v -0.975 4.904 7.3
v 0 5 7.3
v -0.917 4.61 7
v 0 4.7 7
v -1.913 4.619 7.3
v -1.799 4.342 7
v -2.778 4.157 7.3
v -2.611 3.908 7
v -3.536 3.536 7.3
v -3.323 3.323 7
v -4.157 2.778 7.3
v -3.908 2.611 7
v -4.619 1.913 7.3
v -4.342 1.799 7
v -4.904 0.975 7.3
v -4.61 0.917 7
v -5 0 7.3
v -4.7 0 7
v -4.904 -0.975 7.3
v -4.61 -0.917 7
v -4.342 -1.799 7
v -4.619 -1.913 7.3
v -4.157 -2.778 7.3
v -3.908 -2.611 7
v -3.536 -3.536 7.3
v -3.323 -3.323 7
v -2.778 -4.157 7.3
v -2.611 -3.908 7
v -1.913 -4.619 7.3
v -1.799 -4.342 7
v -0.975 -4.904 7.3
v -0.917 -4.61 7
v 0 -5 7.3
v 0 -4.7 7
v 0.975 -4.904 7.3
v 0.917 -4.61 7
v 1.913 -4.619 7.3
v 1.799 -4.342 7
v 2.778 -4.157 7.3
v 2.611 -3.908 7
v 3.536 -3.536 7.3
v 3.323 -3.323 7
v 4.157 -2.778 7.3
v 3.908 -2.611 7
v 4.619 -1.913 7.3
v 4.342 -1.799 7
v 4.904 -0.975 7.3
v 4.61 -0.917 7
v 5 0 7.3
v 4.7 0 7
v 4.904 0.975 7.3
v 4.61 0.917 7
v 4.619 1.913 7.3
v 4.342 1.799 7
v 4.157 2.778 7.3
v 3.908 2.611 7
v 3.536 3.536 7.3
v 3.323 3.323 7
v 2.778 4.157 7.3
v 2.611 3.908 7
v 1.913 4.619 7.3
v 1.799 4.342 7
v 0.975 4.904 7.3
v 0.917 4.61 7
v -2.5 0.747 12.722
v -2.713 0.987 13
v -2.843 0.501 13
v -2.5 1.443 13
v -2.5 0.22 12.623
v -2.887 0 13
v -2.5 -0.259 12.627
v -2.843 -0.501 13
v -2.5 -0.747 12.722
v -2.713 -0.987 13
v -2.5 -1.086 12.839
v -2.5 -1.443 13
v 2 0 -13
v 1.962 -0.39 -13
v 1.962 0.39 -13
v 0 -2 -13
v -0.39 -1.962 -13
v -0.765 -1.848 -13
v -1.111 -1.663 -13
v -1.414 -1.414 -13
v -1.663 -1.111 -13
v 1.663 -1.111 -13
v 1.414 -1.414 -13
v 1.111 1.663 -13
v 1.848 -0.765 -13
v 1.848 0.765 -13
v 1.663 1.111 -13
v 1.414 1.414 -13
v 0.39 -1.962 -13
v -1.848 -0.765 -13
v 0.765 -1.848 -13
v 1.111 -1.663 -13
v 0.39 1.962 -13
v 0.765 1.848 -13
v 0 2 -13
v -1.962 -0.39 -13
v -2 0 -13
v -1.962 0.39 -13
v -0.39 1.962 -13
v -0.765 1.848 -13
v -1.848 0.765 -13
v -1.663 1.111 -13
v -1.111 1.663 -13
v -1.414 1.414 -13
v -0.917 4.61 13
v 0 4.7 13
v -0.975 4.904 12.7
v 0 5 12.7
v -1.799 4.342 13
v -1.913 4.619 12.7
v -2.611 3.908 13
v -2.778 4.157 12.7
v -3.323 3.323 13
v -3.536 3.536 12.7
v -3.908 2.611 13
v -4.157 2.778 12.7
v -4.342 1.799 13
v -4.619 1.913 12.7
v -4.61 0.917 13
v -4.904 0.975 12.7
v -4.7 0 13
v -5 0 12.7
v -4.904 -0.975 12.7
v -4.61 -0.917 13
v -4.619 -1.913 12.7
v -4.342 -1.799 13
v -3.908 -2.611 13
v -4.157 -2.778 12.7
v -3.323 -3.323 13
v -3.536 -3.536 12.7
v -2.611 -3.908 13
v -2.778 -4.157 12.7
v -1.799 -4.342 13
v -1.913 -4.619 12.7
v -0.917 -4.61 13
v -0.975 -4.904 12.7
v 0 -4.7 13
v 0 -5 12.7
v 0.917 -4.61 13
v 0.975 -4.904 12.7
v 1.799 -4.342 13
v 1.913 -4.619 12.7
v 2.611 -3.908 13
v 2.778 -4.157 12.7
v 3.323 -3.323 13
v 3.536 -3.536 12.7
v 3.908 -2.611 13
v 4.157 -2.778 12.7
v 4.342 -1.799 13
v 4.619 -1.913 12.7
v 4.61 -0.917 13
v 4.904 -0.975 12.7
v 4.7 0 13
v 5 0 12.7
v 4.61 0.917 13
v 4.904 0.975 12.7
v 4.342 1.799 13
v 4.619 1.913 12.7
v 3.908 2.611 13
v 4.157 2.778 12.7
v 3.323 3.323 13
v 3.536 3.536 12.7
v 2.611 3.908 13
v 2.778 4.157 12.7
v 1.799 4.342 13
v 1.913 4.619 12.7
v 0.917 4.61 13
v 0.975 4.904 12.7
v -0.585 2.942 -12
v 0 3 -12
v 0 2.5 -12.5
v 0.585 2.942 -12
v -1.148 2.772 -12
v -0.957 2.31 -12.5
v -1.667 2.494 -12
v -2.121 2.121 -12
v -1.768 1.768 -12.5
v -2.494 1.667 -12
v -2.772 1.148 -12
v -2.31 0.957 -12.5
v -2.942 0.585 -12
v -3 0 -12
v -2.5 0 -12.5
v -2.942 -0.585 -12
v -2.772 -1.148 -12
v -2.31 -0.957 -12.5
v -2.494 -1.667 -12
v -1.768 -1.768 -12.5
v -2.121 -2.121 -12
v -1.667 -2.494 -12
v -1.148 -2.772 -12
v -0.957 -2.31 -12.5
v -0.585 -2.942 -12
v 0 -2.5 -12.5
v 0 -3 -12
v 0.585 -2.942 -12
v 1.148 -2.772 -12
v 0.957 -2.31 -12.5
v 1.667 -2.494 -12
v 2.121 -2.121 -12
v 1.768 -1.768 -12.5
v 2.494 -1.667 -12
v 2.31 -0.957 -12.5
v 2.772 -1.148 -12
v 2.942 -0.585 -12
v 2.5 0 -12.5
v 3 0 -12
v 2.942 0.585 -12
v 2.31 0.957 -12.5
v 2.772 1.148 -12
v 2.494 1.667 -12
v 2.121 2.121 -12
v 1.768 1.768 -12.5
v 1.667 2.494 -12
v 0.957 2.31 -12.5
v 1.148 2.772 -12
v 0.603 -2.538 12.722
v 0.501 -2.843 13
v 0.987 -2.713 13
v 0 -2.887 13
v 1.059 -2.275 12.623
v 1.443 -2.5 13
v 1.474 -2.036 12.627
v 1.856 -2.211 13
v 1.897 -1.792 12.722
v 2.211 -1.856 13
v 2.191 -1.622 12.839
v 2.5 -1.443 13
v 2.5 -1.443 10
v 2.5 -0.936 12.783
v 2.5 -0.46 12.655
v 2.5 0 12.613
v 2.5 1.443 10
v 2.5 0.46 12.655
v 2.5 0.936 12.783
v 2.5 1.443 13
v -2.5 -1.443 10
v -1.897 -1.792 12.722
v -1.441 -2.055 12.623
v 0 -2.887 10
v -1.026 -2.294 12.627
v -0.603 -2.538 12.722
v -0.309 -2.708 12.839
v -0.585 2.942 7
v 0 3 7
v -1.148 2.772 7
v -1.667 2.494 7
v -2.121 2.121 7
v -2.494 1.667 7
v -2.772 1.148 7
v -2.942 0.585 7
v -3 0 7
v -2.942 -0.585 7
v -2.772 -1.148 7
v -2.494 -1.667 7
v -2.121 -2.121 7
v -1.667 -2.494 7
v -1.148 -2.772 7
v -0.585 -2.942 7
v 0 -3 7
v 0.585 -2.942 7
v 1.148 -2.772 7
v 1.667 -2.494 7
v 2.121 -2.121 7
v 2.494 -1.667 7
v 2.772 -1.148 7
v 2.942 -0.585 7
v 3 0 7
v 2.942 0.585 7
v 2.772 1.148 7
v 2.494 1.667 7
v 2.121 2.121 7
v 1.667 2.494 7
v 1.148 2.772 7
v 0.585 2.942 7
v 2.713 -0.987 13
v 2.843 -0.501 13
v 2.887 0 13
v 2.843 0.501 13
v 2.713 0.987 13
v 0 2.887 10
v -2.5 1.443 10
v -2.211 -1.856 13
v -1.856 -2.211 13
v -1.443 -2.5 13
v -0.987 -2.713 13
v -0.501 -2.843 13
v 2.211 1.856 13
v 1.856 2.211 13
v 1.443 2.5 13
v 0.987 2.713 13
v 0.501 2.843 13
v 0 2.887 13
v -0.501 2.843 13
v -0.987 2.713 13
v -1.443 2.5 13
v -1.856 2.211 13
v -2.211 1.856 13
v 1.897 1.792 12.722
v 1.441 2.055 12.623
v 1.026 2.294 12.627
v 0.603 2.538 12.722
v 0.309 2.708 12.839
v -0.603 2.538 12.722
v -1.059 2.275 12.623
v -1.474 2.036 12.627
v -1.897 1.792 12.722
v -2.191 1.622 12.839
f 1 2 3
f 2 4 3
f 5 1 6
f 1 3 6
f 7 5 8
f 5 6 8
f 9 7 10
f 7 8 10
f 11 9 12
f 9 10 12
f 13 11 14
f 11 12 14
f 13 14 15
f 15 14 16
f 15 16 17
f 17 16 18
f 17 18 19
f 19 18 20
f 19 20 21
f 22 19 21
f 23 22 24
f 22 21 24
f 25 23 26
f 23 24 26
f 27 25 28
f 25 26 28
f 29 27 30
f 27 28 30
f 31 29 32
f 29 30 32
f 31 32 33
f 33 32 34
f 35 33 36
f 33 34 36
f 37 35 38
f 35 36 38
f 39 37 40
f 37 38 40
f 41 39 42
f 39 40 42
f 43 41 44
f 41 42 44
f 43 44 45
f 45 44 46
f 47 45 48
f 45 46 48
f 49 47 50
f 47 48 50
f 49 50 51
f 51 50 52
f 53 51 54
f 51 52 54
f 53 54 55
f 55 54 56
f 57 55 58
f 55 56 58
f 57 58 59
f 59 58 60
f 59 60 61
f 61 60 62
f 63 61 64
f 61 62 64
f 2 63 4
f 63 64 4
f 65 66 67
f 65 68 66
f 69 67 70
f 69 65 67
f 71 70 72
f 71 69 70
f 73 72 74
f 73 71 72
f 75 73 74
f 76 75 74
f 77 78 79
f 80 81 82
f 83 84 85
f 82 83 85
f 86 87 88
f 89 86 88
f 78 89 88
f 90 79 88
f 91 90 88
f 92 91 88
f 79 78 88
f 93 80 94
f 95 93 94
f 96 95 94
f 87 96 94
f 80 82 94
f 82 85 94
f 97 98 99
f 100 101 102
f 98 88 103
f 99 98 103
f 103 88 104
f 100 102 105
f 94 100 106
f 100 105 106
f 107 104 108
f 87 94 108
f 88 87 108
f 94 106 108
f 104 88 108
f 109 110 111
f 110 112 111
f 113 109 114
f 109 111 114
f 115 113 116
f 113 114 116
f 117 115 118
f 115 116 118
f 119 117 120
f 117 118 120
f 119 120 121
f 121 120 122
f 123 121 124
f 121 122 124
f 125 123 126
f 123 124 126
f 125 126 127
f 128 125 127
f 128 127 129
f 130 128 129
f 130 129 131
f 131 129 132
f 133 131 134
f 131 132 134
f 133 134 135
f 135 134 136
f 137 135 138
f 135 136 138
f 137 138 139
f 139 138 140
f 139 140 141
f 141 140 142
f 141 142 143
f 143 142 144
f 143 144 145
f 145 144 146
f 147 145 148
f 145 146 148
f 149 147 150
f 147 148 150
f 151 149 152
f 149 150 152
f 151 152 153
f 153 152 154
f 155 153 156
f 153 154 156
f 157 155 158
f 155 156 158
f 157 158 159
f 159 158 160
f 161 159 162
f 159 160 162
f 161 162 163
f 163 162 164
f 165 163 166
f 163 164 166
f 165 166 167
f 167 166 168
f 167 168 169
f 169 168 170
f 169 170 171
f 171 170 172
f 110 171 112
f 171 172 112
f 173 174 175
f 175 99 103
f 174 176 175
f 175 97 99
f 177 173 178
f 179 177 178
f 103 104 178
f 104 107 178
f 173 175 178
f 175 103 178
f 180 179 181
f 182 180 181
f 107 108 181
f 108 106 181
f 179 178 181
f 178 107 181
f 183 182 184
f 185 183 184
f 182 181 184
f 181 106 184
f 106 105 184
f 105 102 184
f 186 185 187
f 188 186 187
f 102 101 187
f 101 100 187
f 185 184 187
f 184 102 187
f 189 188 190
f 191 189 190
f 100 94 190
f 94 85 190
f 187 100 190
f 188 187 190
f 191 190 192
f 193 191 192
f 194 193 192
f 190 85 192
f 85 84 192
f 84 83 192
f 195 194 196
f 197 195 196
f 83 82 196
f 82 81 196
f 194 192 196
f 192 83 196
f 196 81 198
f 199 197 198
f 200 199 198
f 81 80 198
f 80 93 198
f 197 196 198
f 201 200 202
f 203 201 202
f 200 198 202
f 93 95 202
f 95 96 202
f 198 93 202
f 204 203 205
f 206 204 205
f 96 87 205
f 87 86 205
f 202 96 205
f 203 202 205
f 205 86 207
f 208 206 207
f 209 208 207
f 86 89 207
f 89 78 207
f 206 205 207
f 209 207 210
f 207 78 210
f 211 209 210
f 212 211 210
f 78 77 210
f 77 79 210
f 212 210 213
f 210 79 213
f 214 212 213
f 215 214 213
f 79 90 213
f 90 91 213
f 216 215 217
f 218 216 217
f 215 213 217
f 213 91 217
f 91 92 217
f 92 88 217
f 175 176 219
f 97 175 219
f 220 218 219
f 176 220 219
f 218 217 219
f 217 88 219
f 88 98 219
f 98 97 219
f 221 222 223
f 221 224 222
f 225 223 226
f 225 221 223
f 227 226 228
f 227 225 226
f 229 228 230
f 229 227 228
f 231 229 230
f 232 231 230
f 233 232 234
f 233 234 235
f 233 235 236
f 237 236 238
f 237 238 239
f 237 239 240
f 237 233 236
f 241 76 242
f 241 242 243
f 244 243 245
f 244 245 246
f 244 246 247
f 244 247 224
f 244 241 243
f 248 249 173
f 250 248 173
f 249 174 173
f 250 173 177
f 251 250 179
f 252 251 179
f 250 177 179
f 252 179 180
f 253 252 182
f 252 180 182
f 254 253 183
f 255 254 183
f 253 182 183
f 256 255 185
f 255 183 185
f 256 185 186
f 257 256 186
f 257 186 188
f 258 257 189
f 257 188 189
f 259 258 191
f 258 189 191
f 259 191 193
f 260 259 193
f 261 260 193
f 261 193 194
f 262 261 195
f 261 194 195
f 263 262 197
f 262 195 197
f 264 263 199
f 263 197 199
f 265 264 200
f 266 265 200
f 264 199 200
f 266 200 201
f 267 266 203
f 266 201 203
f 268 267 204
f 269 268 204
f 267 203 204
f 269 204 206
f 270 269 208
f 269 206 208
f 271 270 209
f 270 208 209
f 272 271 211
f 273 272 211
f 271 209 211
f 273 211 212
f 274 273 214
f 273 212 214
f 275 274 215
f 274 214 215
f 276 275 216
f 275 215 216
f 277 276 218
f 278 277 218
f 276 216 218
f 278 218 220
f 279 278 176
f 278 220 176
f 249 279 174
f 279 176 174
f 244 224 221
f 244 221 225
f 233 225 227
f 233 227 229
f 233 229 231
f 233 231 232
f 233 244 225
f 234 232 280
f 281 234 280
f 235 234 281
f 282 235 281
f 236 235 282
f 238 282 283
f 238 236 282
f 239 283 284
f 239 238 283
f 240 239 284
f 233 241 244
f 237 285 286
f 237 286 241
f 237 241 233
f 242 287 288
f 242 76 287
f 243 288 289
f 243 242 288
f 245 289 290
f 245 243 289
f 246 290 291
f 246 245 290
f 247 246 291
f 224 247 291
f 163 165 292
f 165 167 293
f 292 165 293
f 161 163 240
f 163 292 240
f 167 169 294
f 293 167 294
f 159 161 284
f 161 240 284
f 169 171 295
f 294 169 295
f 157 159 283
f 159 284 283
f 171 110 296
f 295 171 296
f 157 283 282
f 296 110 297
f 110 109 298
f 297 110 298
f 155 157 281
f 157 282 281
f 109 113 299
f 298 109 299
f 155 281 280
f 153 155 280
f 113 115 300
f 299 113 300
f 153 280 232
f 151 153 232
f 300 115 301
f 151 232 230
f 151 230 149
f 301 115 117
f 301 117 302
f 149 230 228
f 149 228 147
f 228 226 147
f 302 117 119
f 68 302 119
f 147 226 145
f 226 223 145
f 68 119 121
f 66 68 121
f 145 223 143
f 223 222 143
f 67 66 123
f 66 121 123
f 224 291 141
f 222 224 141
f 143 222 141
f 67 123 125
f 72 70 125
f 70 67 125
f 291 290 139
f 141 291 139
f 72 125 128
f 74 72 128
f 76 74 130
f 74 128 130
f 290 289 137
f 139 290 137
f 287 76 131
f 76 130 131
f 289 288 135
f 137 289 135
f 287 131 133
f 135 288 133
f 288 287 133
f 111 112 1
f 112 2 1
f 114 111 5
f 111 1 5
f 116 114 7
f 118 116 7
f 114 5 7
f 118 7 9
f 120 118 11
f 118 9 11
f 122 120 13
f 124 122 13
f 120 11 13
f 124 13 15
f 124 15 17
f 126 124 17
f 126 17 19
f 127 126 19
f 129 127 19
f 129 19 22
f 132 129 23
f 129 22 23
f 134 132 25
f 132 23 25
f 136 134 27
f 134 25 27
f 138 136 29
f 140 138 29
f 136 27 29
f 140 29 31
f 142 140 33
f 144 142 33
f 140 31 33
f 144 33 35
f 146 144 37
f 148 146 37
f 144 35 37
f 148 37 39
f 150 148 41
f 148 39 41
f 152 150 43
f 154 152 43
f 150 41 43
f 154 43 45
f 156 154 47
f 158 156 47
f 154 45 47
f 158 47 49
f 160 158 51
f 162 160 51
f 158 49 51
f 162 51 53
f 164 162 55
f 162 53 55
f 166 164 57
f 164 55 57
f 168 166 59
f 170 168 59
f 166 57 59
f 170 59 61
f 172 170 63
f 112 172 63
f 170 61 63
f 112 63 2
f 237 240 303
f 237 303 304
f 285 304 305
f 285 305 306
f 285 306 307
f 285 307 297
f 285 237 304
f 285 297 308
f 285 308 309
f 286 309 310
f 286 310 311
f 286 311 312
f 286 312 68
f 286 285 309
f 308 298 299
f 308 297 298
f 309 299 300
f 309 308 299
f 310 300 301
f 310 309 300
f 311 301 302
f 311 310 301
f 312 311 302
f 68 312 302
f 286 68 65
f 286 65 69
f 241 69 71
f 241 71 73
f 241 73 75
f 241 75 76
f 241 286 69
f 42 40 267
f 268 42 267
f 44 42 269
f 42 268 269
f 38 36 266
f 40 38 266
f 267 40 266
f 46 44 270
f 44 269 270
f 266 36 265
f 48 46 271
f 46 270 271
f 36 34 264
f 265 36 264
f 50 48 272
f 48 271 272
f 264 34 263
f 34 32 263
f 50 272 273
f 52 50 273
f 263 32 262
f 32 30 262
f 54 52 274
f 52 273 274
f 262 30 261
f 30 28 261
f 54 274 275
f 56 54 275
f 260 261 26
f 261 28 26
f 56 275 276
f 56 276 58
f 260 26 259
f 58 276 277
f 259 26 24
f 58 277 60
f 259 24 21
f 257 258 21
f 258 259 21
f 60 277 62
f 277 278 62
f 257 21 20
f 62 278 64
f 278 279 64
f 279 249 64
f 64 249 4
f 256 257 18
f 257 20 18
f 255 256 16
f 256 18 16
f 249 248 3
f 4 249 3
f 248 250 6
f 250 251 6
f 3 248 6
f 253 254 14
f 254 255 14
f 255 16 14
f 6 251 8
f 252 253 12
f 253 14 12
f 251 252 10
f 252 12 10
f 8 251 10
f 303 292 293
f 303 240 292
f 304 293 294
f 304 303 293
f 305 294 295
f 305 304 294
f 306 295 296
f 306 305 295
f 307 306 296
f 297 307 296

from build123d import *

# Parameters (mm, degrees)
CUT_EXTRUDE1_START = -3
CUT_EXTRUDE1_DEPTH = 3
SKETCH4_R          = 2.886751346
CUT_EXTRUDE2_DEPTH = 0.5
CUT_EXTRUDE2_TAPER = 45


with BuildPart() as part:
    # Sketch2 → Revolve1 (revolve)
    with BuildSketch(Plane(origin=(0, 0, 0), x_dir=(0, 0, -1), z_dir=(1, 0, 0))):
        Polygon((-12.7, 5), (-7.3, 5), (-7, 4.7), (-7, 3), (12, 3), (13, 2), (13, 0), (-13, 0), (-13, 4.7), align=None)
    revolve(axis=Axis((0, 0, -13), (0, 0, 1)))

    # Sketch3 → Cut-Extrude1 (cut)
    with BuildSketch(Plane.XY.offset(13).offset(CUT_EXTRUDE1_START)):
        Polygon((0, 2.886751346), (-2.5, 1.443375673), (-2.5, -1.443375673), (0, -2.886751346), (2.5, -1.443375673), (2.5, 1.443375673), align=None)
    extrude(amount=CUT_EXTRUDE1_DEPTH, mode=Mode.SUBTRACT)

    # Sketch4 → Cut-Extrude2 (cut)
    with BuildSketch(Plane.XY.offset(13)):
        Circle(SKETCH4_R)
    extrude(amount=-CUT_EXTRUDE2_DEPTH, taper=CUT_EXTRUDE2_TAPER, mode=Mode.SUBTRACT)


solid = part.part
